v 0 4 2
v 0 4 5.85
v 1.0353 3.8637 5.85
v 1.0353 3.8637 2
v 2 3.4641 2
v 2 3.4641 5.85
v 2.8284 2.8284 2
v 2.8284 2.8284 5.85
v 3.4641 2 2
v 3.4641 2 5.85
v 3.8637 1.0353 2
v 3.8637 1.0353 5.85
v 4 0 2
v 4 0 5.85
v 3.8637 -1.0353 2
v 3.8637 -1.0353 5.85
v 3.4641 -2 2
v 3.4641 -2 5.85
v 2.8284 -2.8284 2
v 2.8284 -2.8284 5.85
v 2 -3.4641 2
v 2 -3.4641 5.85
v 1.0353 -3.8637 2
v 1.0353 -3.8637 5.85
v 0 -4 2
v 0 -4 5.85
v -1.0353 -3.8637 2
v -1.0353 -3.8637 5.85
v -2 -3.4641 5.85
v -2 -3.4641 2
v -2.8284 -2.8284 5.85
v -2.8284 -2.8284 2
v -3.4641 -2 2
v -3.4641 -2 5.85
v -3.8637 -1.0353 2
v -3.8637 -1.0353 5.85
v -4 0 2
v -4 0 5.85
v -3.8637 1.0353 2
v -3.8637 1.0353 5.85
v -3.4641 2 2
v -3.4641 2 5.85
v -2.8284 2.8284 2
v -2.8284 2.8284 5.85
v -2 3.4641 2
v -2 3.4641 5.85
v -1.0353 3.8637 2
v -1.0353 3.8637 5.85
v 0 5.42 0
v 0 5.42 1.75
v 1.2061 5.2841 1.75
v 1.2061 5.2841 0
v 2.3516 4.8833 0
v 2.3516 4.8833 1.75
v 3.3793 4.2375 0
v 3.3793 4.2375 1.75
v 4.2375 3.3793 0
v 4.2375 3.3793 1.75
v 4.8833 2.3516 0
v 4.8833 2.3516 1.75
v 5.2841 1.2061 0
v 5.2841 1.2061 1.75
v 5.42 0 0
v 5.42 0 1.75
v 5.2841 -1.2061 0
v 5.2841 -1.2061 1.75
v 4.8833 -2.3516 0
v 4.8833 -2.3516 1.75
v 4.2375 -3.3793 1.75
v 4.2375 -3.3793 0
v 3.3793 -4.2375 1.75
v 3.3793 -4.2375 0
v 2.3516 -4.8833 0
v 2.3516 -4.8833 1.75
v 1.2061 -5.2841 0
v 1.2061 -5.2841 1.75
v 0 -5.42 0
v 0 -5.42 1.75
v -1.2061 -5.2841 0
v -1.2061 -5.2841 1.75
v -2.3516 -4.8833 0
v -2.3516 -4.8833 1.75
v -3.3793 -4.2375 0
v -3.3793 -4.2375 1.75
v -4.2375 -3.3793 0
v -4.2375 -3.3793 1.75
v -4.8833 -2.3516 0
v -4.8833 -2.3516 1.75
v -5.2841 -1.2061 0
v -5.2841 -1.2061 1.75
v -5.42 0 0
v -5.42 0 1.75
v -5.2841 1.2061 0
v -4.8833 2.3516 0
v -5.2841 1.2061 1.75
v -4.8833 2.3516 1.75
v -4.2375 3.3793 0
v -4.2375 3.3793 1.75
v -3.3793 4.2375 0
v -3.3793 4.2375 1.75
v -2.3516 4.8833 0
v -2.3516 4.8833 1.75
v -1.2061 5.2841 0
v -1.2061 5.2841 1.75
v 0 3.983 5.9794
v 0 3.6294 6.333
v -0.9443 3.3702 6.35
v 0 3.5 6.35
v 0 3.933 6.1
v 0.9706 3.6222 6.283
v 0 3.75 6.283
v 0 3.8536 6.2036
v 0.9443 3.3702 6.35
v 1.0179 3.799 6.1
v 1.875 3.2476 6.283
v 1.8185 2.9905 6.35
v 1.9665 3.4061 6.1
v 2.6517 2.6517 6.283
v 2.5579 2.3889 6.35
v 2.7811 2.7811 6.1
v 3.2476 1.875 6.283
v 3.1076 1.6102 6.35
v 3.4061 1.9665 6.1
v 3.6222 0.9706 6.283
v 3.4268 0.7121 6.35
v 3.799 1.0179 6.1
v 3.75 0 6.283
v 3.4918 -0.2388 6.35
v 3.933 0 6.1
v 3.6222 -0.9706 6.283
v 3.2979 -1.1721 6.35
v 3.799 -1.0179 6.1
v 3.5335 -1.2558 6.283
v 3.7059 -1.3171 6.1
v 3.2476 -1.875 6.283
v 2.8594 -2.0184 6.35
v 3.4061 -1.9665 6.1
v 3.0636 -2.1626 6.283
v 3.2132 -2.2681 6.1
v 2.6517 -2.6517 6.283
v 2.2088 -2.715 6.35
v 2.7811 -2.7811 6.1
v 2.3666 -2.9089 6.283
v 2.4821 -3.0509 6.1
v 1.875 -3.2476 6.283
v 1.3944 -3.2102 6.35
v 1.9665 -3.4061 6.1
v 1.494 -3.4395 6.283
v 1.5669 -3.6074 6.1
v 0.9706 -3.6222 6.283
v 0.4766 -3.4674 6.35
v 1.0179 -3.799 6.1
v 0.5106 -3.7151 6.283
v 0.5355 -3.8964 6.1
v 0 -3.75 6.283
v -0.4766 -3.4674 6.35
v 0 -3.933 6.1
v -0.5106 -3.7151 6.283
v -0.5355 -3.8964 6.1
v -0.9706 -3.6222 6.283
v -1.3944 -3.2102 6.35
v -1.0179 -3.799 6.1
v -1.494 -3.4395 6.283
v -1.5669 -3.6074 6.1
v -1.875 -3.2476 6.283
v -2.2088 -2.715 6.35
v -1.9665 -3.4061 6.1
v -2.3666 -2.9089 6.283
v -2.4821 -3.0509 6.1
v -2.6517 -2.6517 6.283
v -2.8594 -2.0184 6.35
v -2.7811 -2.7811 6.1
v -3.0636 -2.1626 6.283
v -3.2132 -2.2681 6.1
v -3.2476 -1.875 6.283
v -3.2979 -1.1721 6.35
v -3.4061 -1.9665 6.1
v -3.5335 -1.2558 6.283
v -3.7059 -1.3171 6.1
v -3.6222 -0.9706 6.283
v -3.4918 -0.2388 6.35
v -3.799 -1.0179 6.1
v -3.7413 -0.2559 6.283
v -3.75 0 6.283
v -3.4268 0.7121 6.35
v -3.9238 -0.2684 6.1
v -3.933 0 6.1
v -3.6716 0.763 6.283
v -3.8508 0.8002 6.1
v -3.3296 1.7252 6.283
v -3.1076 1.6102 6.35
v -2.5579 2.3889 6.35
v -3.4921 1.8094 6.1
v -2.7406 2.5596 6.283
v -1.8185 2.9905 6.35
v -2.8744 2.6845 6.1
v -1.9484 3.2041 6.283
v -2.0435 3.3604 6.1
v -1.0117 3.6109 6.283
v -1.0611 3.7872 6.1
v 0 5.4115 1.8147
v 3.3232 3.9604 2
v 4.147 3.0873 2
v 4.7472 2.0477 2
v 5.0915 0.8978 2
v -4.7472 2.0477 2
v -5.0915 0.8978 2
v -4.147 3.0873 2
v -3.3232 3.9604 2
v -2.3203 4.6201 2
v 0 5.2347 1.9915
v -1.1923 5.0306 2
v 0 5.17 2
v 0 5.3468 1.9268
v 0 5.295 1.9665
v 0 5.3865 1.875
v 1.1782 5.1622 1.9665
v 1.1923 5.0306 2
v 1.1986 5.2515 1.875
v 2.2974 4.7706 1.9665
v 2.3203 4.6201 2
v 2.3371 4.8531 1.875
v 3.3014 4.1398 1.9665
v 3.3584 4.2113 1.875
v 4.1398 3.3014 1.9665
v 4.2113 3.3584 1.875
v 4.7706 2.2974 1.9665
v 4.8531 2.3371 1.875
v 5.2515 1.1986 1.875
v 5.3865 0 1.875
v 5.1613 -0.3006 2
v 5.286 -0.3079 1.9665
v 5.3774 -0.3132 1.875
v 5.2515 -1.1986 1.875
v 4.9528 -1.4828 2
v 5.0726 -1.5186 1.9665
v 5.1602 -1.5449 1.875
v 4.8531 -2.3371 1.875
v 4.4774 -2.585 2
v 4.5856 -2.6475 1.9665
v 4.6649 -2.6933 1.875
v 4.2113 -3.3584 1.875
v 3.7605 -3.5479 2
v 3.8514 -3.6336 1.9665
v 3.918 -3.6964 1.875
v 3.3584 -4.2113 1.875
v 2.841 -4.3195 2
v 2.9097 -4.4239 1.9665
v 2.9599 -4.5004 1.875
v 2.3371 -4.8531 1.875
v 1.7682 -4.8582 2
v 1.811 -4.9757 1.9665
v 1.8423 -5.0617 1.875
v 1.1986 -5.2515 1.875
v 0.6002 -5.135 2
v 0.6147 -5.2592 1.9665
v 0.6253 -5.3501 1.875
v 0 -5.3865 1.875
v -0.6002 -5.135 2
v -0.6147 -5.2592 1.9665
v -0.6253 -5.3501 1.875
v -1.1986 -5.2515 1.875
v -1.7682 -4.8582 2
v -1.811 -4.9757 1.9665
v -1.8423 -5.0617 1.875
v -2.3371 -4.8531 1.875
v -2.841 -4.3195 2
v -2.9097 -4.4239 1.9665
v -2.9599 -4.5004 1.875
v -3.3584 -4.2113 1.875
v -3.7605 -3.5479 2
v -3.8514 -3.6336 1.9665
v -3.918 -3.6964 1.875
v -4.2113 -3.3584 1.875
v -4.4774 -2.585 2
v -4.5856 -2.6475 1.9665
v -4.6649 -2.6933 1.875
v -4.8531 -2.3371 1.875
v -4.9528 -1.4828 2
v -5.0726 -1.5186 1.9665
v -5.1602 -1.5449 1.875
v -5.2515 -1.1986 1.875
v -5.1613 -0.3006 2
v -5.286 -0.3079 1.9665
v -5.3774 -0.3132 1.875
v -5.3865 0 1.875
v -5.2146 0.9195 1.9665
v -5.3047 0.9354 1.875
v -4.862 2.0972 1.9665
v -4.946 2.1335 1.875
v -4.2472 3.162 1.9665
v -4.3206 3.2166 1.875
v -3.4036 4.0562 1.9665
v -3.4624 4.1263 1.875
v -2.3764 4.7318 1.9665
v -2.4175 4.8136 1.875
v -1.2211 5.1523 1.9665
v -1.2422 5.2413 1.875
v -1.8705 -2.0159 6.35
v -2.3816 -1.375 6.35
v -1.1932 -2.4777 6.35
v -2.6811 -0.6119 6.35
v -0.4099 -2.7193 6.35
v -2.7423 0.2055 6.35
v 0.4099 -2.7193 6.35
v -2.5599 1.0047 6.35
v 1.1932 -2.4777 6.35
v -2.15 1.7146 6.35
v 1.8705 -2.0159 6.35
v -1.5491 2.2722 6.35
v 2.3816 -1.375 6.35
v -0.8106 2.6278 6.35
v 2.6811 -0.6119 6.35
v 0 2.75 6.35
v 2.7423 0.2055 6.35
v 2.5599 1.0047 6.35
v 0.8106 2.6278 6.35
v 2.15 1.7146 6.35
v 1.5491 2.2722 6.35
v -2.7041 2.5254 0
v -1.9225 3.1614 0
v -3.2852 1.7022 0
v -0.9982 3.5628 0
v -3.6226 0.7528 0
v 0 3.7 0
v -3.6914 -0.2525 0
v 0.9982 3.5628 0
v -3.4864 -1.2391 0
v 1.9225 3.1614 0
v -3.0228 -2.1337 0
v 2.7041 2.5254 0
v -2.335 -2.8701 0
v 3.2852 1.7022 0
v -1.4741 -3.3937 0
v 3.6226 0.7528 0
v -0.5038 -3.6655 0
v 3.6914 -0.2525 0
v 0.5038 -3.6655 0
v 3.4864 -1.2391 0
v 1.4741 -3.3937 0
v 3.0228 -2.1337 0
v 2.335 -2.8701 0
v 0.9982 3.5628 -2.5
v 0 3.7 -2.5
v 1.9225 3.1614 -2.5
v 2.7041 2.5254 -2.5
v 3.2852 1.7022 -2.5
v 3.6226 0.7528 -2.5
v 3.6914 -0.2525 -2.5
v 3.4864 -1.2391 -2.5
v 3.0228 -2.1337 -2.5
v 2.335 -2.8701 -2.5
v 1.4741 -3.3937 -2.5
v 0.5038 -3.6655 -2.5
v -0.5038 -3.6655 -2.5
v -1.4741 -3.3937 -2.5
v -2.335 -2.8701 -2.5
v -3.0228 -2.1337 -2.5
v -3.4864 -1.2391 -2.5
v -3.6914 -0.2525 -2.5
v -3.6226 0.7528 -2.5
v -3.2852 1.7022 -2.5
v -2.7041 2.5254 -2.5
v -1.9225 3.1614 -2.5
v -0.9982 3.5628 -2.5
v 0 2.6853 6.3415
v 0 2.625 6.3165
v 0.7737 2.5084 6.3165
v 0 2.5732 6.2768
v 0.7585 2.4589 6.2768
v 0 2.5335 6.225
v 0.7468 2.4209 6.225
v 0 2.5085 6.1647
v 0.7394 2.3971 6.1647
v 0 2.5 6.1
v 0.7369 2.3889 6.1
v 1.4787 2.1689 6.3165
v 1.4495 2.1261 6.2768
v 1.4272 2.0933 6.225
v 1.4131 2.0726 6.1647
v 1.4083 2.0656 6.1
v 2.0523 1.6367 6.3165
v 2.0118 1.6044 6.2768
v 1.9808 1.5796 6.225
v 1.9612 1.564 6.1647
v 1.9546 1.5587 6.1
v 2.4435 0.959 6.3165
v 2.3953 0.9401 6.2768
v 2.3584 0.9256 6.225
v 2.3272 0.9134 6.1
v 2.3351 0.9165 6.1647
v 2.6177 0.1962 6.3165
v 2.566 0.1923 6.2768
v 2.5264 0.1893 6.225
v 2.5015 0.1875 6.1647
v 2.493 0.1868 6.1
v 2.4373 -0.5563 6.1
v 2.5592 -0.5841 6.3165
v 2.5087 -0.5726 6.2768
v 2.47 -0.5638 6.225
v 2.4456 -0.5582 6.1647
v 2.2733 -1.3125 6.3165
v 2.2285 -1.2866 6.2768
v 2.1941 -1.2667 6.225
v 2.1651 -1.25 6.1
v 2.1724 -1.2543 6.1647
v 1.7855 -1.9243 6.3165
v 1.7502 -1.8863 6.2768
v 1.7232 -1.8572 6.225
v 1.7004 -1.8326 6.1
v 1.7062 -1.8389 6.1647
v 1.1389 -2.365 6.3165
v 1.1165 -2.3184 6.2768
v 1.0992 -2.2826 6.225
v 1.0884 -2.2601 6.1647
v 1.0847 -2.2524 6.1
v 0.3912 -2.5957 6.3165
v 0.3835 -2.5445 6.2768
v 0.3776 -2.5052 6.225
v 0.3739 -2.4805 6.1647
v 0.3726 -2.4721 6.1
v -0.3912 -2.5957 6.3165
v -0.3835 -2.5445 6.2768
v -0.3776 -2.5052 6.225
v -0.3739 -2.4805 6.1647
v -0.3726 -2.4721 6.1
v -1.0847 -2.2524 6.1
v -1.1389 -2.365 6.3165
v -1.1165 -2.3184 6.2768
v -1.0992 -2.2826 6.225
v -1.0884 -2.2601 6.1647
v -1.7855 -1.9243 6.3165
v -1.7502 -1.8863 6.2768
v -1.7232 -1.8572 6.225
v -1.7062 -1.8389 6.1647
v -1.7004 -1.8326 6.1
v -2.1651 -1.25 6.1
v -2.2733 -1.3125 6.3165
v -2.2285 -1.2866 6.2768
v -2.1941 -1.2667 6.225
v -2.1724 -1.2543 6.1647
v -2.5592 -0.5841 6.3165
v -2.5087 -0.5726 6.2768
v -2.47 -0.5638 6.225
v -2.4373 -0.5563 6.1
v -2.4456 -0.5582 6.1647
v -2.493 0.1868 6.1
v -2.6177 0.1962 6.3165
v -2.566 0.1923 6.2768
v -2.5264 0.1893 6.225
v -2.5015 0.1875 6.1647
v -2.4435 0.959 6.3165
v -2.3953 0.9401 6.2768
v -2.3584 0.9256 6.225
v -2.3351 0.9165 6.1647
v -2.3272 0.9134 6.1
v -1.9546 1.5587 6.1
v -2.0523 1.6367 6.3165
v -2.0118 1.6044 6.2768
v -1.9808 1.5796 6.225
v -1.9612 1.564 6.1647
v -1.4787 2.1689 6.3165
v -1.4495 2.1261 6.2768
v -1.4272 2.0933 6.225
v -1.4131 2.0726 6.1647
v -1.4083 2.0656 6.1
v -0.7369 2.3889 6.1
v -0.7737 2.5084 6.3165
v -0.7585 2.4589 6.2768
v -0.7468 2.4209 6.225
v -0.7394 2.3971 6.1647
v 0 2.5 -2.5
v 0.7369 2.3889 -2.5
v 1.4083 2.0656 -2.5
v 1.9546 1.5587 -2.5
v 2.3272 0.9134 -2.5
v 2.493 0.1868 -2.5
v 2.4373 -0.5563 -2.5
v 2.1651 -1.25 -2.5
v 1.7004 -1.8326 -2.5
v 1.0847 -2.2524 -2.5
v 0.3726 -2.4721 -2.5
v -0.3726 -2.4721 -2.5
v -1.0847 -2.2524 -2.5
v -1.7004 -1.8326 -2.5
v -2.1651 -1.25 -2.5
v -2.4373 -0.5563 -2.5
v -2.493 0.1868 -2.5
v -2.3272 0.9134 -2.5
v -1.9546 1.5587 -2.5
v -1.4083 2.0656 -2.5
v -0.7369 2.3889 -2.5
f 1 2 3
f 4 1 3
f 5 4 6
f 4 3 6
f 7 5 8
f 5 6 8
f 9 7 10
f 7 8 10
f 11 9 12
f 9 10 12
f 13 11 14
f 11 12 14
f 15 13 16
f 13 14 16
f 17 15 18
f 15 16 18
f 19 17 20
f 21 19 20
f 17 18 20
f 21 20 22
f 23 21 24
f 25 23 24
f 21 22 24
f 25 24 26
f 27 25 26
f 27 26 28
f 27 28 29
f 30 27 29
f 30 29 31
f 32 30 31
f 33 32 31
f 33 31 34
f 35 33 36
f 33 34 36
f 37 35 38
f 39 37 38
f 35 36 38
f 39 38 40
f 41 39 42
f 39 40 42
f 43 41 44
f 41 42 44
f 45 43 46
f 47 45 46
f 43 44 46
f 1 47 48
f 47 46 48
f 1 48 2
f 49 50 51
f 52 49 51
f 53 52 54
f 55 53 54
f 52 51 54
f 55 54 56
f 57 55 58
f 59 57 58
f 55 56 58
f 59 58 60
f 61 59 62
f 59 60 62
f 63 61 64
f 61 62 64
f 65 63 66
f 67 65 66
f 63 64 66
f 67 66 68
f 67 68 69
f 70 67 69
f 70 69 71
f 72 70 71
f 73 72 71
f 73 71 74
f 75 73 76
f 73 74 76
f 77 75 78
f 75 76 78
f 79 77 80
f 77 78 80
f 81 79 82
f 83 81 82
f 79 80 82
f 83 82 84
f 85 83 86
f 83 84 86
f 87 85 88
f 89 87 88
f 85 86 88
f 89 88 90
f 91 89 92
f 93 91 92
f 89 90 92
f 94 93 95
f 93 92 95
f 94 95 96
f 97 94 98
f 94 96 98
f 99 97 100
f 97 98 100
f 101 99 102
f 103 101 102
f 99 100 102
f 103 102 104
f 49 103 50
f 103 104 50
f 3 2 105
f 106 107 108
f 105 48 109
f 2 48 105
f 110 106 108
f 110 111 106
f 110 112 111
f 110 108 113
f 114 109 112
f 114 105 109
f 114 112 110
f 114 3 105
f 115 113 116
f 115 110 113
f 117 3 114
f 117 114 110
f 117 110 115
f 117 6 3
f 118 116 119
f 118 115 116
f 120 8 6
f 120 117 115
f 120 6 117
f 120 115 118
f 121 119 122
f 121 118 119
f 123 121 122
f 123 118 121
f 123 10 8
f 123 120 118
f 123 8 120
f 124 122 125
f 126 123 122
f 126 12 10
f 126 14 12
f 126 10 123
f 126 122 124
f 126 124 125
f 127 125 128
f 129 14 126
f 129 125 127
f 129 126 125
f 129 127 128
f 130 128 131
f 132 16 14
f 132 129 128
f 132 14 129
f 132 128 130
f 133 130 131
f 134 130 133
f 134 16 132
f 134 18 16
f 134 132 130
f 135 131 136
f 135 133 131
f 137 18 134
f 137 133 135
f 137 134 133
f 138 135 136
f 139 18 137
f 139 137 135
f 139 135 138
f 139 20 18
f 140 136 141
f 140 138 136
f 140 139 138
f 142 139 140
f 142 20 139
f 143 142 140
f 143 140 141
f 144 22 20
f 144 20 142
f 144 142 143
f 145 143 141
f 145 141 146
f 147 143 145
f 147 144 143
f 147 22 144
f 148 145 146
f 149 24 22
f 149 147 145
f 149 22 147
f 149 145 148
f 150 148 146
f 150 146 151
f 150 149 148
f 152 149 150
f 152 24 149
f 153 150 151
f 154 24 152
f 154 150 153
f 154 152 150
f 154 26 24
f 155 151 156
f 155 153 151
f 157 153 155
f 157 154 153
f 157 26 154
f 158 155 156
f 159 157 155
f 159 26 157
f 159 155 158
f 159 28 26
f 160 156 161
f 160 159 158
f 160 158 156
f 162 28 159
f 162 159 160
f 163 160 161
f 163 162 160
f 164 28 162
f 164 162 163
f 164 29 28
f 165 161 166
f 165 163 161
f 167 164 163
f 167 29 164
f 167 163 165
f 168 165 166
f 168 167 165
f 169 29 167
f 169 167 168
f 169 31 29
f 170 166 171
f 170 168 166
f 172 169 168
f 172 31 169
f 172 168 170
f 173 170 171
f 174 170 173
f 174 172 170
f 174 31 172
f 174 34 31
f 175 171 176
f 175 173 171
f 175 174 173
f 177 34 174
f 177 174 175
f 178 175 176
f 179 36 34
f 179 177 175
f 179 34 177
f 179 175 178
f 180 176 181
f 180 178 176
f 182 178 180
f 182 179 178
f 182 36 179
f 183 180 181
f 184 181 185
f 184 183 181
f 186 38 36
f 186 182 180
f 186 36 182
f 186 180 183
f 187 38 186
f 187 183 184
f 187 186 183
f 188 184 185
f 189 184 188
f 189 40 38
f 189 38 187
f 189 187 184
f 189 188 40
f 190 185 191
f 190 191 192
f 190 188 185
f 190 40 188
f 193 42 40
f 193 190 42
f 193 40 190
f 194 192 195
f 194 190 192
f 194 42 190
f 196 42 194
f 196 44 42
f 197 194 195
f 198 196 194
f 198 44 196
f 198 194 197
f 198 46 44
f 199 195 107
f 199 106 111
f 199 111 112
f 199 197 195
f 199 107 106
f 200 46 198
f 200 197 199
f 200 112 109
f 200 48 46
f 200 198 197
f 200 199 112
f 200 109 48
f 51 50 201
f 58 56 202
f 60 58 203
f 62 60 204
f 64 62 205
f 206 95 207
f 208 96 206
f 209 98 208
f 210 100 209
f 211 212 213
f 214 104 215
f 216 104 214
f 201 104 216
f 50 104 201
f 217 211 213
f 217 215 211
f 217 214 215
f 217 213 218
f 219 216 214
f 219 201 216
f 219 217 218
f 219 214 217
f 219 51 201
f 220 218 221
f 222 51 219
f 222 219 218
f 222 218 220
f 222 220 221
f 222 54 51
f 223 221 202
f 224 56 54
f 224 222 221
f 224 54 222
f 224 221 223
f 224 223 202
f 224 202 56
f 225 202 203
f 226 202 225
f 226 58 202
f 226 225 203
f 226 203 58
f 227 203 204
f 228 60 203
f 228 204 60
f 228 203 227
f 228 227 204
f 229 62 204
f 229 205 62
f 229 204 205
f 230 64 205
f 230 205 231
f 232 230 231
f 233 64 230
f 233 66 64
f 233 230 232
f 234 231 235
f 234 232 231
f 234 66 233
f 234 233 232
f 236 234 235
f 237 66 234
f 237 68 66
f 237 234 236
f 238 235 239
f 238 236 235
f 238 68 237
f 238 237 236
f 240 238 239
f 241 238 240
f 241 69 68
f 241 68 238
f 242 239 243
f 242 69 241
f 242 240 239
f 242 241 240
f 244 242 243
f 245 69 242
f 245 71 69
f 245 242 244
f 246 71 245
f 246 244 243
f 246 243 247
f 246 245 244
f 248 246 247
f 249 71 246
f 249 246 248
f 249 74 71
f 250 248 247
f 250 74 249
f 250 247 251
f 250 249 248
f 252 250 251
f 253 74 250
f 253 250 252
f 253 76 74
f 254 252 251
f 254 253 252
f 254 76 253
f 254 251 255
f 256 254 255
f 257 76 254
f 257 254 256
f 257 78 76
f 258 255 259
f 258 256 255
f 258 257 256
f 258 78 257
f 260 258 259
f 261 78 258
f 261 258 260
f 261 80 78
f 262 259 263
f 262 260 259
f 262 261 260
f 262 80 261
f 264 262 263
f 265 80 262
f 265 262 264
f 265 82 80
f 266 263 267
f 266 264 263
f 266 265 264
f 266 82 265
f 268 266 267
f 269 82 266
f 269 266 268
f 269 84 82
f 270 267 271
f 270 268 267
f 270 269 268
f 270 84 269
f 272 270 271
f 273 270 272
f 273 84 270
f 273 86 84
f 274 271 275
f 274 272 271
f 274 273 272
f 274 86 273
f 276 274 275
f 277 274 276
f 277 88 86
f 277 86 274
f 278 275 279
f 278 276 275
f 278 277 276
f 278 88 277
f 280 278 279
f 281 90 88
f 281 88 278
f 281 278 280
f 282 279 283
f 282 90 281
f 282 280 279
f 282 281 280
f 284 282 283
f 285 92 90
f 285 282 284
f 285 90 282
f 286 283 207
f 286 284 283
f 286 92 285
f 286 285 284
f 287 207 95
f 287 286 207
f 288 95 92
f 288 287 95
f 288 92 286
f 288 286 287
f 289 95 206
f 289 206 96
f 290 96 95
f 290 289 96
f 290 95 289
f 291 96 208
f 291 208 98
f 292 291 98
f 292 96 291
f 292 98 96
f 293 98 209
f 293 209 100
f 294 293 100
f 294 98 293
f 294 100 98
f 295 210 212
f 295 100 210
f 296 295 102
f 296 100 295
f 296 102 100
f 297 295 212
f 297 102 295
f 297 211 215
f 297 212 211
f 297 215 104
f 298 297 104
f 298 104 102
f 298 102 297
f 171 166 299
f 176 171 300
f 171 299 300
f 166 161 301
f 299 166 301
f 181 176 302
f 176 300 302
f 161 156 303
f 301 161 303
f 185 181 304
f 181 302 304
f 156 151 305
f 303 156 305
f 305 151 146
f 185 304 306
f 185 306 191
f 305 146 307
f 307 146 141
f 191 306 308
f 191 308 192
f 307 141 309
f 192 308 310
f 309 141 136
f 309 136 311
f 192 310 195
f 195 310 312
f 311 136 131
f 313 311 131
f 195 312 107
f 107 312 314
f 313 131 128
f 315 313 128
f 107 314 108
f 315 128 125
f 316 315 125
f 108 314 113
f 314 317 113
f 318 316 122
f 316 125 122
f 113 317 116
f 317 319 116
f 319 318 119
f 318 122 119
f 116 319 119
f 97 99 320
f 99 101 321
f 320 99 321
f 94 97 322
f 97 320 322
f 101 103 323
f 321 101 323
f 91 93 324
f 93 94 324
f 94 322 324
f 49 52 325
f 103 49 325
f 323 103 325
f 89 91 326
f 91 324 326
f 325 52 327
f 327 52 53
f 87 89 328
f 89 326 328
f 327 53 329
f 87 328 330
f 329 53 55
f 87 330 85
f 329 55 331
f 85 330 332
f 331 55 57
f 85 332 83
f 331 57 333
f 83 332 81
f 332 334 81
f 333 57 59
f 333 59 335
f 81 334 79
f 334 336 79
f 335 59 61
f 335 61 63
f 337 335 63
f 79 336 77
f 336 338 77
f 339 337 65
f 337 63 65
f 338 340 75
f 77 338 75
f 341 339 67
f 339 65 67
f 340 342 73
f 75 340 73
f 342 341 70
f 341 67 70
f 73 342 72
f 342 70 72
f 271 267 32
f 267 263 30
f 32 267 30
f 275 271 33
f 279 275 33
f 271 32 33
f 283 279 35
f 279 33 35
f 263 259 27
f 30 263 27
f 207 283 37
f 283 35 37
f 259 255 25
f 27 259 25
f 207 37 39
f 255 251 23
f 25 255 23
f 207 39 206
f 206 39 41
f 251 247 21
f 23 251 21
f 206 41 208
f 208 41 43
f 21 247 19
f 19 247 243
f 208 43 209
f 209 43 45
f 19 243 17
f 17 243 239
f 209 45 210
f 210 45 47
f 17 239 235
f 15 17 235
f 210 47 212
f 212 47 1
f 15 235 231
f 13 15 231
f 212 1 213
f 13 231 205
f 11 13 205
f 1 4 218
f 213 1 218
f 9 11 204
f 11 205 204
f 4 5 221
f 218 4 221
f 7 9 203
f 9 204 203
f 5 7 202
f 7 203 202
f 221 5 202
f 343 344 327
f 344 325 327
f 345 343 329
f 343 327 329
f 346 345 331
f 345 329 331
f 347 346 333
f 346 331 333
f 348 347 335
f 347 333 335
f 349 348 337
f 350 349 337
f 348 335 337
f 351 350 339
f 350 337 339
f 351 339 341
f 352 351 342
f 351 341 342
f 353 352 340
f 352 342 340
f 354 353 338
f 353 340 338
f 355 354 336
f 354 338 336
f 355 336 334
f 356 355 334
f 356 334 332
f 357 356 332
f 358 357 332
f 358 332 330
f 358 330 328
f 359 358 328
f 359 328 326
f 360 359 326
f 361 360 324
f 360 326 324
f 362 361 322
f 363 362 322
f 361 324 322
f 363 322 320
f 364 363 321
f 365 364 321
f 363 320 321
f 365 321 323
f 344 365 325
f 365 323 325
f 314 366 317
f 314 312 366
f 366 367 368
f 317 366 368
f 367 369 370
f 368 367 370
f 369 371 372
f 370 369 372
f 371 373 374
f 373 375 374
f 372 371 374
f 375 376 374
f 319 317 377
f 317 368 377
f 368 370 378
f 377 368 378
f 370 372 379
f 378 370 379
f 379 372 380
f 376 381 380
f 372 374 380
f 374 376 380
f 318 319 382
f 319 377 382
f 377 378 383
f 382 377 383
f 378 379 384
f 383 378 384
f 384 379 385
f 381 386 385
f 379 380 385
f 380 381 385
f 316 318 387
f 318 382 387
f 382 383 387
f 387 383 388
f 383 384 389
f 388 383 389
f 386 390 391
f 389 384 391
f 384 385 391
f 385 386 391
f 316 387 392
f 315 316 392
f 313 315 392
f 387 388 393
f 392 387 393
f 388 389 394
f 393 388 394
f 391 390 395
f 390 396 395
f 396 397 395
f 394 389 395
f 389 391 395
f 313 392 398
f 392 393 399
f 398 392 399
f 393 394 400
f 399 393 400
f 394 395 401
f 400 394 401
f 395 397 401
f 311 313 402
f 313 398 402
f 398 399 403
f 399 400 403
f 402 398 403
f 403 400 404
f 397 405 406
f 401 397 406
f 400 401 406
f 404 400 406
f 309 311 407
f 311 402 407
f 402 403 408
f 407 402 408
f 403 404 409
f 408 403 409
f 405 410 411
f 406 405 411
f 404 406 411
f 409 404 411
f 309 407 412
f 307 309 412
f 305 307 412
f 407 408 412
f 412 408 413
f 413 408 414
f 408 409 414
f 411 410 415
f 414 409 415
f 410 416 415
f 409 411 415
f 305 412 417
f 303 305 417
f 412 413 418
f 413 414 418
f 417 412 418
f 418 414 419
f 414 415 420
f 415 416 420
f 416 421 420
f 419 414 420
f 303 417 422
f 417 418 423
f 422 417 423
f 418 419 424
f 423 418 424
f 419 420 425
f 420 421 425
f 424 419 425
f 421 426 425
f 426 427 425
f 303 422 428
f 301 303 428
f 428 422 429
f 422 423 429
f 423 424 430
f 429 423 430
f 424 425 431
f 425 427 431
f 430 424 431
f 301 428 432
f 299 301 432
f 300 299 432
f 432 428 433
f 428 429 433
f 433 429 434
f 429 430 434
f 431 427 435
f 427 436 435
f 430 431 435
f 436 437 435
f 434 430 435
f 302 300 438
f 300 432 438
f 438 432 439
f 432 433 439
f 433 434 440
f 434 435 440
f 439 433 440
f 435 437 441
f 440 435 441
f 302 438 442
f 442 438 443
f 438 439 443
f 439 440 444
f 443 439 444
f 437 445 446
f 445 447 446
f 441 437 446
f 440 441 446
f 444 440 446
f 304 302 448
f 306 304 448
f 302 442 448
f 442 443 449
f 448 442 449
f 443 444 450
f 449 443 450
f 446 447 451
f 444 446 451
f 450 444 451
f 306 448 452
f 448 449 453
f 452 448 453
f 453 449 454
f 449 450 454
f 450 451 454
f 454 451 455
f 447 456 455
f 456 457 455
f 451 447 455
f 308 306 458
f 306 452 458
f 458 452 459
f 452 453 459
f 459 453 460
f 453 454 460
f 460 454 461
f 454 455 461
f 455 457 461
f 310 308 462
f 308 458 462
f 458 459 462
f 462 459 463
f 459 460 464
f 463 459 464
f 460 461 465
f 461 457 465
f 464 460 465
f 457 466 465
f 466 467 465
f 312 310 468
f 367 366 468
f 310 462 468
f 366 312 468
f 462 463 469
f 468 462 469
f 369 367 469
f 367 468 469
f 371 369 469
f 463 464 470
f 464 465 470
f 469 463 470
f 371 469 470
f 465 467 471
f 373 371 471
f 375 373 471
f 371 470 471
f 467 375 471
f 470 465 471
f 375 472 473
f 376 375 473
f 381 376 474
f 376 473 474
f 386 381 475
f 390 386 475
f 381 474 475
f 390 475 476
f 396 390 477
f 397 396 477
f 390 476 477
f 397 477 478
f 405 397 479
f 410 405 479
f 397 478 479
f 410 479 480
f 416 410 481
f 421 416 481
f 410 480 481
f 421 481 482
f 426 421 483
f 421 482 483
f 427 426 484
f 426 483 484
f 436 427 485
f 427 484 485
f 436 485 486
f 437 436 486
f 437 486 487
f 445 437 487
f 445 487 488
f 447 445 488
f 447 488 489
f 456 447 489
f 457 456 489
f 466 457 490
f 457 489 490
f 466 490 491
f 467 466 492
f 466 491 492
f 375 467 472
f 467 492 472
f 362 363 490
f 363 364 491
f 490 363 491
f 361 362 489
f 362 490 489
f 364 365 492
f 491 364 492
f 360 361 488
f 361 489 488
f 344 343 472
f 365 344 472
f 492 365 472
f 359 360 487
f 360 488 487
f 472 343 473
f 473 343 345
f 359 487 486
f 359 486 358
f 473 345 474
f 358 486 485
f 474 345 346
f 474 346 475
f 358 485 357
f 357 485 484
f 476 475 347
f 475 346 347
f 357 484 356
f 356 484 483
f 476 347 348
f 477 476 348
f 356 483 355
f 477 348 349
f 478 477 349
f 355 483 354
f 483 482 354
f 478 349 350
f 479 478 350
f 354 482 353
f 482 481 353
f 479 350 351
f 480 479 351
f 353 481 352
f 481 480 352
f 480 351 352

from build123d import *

# Parameters (mm, degrees)
F2_R = 0.25
F3_R = 0.5
F4_R = 0.25


with BuildPart() as f1:
    # F0 (on Right) → F1 (revolve)
    with BuildSketch(Plane.YZ):
        Polygon((4, 6.35), (2.5, 6.35), (2.5, -2.5), (3.7, -2.5), (3.7, 0), (5.42, 0), (5.42, 2), (4, 2), align=None)
    revolve(axis=Axis((0, 0, -1.722812), (0, 0, -1)))

    # F2
    f2_edges = [f1.edges().sort_by_distance(p)[0] for p in [
        (0, -2.5, 6.35),
    ]]
    fillet(f2_edges, radius=F2_R)

    # F3
    f3_edges = [f1.edges().sort_by_distance(p)[0] for p in [
        (0, -4, 6.35),
    ]]
    fillet(f3_edges, radius=F3_R)

    # F4
    f4_edges = [f1.edges().sort_by_distance(p)[0] for p in [
        (0, -5.42, 2),
    ]]
    fillet(f4_edges, radius=F4_R)


solid = f1.part
